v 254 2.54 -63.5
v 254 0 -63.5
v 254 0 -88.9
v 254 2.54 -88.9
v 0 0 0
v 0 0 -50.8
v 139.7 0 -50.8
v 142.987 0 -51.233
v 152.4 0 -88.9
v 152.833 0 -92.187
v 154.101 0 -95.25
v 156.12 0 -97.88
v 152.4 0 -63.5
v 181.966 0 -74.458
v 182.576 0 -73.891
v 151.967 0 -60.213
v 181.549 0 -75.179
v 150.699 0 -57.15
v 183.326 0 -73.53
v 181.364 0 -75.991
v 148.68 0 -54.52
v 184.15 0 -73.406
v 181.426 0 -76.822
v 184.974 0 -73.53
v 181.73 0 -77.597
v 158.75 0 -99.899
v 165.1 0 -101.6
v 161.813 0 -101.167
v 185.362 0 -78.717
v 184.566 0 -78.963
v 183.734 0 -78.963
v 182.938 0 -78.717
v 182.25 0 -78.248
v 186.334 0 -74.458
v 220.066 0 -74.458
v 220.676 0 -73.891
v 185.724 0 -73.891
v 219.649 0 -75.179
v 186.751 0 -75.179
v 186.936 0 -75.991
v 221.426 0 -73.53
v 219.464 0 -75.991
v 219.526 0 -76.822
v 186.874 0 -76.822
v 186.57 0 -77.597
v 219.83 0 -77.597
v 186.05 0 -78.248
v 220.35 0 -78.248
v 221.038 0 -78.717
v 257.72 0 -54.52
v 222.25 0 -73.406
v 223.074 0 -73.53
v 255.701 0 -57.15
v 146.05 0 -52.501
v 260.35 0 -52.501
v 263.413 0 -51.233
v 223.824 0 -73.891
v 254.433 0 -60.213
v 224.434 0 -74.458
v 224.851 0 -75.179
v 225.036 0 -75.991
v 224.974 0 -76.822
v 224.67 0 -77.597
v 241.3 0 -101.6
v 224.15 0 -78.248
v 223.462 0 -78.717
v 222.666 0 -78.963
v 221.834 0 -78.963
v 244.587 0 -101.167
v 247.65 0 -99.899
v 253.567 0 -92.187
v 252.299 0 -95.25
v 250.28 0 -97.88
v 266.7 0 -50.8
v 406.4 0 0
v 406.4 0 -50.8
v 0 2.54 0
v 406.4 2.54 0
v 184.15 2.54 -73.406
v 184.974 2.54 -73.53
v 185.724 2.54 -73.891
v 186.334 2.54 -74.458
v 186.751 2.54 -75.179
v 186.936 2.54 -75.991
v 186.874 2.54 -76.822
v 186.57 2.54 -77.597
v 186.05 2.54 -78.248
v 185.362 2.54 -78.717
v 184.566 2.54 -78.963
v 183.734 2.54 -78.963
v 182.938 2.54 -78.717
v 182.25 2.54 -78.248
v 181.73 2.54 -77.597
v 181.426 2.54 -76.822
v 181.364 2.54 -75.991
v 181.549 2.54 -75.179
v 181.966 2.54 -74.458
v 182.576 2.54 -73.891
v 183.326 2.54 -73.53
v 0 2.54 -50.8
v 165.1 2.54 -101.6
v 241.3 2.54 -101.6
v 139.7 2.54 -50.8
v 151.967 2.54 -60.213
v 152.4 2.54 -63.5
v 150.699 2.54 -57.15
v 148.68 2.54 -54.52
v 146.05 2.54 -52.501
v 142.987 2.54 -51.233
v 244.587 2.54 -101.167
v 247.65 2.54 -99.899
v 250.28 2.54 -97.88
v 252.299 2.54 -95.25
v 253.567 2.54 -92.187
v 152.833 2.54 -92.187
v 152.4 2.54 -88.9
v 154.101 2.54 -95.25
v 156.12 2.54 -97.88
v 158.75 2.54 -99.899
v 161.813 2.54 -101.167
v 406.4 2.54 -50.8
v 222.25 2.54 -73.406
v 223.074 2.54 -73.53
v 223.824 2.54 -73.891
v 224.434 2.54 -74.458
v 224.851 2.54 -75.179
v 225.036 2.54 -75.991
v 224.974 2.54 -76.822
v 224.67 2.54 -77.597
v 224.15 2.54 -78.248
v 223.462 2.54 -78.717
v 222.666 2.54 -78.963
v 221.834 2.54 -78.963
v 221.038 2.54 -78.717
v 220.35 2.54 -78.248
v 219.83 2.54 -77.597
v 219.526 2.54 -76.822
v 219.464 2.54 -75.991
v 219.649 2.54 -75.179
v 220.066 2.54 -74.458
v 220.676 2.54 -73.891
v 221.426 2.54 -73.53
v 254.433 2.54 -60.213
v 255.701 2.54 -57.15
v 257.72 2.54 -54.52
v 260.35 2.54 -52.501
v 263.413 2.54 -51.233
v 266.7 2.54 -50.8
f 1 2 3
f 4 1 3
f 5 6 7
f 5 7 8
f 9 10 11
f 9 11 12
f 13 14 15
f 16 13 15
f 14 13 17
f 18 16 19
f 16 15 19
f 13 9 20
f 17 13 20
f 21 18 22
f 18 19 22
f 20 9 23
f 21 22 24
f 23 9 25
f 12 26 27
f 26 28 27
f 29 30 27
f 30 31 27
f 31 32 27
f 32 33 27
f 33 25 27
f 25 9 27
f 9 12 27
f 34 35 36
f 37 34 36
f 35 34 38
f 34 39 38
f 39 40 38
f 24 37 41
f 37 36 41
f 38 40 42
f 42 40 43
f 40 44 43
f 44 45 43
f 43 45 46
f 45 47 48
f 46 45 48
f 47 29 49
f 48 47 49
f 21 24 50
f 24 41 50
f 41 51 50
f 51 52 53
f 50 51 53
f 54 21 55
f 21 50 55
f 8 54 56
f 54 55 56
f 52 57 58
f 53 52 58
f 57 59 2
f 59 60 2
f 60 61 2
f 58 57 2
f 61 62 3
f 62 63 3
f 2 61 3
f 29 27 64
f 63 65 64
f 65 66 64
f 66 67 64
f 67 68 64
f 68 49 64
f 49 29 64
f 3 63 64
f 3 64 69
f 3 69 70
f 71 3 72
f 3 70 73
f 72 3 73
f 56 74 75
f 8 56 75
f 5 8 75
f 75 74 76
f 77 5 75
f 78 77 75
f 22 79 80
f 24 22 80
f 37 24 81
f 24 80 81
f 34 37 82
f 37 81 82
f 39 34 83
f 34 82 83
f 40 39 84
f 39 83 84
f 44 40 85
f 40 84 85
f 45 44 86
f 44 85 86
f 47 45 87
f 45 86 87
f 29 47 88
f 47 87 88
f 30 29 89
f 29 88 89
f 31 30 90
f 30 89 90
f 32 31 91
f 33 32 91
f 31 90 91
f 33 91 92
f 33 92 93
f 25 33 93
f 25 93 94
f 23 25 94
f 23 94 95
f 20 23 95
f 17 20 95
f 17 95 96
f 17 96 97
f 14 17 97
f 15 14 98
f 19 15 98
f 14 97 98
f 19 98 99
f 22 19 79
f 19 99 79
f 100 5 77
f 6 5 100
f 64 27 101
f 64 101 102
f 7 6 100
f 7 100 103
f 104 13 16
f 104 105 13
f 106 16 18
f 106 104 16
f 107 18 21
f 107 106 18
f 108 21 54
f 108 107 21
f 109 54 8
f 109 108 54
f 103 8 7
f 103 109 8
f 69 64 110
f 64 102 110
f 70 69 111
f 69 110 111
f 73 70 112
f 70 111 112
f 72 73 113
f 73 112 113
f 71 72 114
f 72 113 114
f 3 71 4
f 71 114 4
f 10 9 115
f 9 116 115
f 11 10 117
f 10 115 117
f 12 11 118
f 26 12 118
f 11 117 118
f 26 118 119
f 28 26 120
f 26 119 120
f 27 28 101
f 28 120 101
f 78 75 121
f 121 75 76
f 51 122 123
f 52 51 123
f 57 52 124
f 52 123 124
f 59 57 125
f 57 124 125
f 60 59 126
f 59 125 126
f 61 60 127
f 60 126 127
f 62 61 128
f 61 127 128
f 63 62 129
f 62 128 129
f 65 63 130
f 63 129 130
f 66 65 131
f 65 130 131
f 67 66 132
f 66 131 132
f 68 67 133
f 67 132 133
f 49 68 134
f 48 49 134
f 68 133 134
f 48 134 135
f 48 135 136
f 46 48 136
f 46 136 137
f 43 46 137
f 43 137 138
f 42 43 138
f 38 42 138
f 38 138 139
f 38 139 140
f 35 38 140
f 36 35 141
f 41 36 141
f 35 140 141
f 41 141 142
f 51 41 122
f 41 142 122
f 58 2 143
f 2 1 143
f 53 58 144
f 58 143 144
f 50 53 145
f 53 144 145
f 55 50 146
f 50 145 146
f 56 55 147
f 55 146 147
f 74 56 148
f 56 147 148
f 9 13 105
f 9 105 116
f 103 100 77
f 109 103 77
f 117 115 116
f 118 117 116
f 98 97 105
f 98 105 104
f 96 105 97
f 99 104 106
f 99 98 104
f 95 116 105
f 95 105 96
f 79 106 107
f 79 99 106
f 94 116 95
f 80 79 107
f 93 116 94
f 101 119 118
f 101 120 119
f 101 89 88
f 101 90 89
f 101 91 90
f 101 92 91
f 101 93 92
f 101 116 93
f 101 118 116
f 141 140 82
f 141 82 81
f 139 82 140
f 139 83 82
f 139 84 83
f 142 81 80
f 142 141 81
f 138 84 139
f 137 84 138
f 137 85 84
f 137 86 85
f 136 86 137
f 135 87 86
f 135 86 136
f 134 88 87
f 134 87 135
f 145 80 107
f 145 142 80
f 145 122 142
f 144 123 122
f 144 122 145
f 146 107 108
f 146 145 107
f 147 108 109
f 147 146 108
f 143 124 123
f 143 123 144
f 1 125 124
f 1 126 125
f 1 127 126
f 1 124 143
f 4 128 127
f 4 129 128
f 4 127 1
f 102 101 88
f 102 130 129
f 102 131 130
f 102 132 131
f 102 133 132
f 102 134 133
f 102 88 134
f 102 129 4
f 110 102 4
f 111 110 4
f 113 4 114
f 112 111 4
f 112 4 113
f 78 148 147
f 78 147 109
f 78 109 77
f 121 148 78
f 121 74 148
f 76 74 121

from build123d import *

# Parameters (mm, degrees)
SKETCH1_W           = 406.4
SKETCH1_H           = 50.8
SKETCH1_W_2         = 101.6
BOSS_EXTRUDE1_DEPTH = 2.54
SKETCH2_R           = 2.794
CUT_EXTRUDE1_DEPTH  = 2.54
FILLET1_R           = 12.7
FILLET2_R           = 12.7


with BuildPart() as part:
    # Sketch1 → Boss-Extrude1 (new body)
    with BuildSketch(Plane(origin=(0, 0, 0), x_dir=(1, 0, 0), z_dir=(0, 1, 0))):
        with Locations((203.2, 25.4)):
            Rectangle(SKETCH1_W, SKETCH1_H)
        with Locations((203.2, 76.2)):
            Rectangle(SKETCH1_W_2, SKETCH1_H)
    extrude(amount=BOSS_EXTRUDE1_DEPTH)

    # Sketch2 → Cut-Extrude1 (cut)
    with BuildSketch(Plane(origin=(0, 2.54, 0), x_dir=(1, 0, 0), z_dir=(0, 1, 0))):
        with Locations(Location((222.25, 76.2, 0), (0, 0, 270))):
            Circle(SKETCH2_R)
        with Locations(Location((184.15, 76.2, 0), (0, 0, 270))):
            Circle(SKETCH2_R)
    extrude(amount=-CUT_EXTRUDE1_DEPTH, mode=Mode.SUBTRACT)

    # Fillet1
    fillet1_edges = [part.edges().sort_by_distance(p)[0] for p in [
        (152.4, 1.27, -101.6),
        (254, 1.27, -101.6),
    ]]
    fillet(fillet1_edges, radius=FILLET1_R)

    # Fillet2
    fillet2_edges = [part.edges().sort_by_distance(p)[0] for p in [
        (152.4, 1.27, -50.8),
        (254, 1.27, -50.8),
    ]]
    fillet(fillet2_edges, radius=FILLET2_R)


solid = part.part
